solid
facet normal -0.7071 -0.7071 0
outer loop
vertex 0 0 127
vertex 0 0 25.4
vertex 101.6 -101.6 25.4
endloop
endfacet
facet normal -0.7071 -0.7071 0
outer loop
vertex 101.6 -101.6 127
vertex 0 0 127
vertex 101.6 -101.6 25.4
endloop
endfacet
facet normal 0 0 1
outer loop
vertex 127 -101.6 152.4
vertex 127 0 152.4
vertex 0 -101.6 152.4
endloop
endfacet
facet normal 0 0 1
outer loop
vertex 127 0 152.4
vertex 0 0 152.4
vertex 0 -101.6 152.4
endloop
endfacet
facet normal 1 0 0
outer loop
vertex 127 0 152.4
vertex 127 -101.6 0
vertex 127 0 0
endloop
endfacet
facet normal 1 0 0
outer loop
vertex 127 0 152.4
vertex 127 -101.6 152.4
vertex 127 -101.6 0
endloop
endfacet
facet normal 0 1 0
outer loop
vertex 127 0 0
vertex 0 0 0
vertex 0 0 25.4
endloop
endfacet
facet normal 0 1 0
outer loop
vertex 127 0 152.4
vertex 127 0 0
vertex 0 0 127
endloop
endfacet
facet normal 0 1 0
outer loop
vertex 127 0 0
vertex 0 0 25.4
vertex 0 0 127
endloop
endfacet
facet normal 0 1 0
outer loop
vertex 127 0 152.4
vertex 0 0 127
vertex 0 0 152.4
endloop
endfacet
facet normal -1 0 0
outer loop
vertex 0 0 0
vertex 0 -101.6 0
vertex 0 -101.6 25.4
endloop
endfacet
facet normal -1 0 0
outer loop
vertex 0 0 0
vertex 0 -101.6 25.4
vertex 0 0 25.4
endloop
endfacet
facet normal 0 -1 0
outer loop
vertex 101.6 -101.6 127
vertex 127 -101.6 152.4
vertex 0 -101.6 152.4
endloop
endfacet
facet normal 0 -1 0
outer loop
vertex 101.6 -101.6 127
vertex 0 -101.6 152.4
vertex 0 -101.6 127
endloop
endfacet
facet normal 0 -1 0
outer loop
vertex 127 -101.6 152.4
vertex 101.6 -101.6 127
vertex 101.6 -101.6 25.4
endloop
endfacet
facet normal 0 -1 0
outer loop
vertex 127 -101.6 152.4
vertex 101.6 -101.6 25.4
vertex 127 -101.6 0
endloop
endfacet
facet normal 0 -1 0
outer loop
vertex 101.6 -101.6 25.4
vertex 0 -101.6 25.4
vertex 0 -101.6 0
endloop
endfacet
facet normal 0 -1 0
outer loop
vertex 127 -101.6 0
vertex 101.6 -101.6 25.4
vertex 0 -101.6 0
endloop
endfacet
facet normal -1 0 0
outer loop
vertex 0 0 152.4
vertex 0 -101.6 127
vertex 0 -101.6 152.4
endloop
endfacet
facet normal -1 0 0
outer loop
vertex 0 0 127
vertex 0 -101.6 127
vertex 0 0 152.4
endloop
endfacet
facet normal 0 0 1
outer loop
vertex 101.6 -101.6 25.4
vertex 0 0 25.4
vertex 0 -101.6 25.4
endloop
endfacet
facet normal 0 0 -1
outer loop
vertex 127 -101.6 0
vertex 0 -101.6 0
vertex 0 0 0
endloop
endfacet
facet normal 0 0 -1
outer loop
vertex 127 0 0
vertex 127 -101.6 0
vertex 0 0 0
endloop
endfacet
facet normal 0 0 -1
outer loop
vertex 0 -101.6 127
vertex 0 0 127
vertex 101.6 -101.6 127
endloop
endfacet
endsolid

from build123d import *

# Parameters (mm, degrees)
F0_W     = 101.6
F0_H     = 101.6
F1_DEPTH = 25.4
F3_DEPTH = 101.6
F4_W     = 101.6
F4_H     = 101.6
F5_DEPTH = 25.4
F6_DEPTH = 25.4


with BuildPart() as f1:
    # F0 (on Top) → F1 (new body)
    with BuildSketch(Plane.XY):
        with Locations((50.8, -50.8)):
            Rectangle(F0_W, F0_H)
    extrude(amount=F1_DEPTH)

    # F2 (on face) → F3 (join)
    with BuildSketch(Plane.XY.offset(25.4)):
        Polygon((101.6, 0), (0, 0), (101.6, -101.6), align=None)
    extrude(amount=F3_DEPTH)

    # F4 (on face) → F5 (join)
    with BuildSketch(Plane.XY.offset(127)):
        with Locations((50.8, -50.8)):
            Rectangle(F4_W, F4_H)
    extrude(amount=F5_DEPTH)

    # F5_face (on face) → F6 (join)
    with BuildSketch(Plane(origin=(101.6, -50.8, 76.2), x_dir=(0, 1, 0), z_dir=(1, 0, 0))):
        Polygon((-50.8, -50.8), (-50.8, -76.2), (50.8, -76.2), (50.8, 76.2), (-50.8, 76.2), (-50.8, 50.8), align=None)
    extrude(amount=F6_DEPTH)


solid = f1.part
